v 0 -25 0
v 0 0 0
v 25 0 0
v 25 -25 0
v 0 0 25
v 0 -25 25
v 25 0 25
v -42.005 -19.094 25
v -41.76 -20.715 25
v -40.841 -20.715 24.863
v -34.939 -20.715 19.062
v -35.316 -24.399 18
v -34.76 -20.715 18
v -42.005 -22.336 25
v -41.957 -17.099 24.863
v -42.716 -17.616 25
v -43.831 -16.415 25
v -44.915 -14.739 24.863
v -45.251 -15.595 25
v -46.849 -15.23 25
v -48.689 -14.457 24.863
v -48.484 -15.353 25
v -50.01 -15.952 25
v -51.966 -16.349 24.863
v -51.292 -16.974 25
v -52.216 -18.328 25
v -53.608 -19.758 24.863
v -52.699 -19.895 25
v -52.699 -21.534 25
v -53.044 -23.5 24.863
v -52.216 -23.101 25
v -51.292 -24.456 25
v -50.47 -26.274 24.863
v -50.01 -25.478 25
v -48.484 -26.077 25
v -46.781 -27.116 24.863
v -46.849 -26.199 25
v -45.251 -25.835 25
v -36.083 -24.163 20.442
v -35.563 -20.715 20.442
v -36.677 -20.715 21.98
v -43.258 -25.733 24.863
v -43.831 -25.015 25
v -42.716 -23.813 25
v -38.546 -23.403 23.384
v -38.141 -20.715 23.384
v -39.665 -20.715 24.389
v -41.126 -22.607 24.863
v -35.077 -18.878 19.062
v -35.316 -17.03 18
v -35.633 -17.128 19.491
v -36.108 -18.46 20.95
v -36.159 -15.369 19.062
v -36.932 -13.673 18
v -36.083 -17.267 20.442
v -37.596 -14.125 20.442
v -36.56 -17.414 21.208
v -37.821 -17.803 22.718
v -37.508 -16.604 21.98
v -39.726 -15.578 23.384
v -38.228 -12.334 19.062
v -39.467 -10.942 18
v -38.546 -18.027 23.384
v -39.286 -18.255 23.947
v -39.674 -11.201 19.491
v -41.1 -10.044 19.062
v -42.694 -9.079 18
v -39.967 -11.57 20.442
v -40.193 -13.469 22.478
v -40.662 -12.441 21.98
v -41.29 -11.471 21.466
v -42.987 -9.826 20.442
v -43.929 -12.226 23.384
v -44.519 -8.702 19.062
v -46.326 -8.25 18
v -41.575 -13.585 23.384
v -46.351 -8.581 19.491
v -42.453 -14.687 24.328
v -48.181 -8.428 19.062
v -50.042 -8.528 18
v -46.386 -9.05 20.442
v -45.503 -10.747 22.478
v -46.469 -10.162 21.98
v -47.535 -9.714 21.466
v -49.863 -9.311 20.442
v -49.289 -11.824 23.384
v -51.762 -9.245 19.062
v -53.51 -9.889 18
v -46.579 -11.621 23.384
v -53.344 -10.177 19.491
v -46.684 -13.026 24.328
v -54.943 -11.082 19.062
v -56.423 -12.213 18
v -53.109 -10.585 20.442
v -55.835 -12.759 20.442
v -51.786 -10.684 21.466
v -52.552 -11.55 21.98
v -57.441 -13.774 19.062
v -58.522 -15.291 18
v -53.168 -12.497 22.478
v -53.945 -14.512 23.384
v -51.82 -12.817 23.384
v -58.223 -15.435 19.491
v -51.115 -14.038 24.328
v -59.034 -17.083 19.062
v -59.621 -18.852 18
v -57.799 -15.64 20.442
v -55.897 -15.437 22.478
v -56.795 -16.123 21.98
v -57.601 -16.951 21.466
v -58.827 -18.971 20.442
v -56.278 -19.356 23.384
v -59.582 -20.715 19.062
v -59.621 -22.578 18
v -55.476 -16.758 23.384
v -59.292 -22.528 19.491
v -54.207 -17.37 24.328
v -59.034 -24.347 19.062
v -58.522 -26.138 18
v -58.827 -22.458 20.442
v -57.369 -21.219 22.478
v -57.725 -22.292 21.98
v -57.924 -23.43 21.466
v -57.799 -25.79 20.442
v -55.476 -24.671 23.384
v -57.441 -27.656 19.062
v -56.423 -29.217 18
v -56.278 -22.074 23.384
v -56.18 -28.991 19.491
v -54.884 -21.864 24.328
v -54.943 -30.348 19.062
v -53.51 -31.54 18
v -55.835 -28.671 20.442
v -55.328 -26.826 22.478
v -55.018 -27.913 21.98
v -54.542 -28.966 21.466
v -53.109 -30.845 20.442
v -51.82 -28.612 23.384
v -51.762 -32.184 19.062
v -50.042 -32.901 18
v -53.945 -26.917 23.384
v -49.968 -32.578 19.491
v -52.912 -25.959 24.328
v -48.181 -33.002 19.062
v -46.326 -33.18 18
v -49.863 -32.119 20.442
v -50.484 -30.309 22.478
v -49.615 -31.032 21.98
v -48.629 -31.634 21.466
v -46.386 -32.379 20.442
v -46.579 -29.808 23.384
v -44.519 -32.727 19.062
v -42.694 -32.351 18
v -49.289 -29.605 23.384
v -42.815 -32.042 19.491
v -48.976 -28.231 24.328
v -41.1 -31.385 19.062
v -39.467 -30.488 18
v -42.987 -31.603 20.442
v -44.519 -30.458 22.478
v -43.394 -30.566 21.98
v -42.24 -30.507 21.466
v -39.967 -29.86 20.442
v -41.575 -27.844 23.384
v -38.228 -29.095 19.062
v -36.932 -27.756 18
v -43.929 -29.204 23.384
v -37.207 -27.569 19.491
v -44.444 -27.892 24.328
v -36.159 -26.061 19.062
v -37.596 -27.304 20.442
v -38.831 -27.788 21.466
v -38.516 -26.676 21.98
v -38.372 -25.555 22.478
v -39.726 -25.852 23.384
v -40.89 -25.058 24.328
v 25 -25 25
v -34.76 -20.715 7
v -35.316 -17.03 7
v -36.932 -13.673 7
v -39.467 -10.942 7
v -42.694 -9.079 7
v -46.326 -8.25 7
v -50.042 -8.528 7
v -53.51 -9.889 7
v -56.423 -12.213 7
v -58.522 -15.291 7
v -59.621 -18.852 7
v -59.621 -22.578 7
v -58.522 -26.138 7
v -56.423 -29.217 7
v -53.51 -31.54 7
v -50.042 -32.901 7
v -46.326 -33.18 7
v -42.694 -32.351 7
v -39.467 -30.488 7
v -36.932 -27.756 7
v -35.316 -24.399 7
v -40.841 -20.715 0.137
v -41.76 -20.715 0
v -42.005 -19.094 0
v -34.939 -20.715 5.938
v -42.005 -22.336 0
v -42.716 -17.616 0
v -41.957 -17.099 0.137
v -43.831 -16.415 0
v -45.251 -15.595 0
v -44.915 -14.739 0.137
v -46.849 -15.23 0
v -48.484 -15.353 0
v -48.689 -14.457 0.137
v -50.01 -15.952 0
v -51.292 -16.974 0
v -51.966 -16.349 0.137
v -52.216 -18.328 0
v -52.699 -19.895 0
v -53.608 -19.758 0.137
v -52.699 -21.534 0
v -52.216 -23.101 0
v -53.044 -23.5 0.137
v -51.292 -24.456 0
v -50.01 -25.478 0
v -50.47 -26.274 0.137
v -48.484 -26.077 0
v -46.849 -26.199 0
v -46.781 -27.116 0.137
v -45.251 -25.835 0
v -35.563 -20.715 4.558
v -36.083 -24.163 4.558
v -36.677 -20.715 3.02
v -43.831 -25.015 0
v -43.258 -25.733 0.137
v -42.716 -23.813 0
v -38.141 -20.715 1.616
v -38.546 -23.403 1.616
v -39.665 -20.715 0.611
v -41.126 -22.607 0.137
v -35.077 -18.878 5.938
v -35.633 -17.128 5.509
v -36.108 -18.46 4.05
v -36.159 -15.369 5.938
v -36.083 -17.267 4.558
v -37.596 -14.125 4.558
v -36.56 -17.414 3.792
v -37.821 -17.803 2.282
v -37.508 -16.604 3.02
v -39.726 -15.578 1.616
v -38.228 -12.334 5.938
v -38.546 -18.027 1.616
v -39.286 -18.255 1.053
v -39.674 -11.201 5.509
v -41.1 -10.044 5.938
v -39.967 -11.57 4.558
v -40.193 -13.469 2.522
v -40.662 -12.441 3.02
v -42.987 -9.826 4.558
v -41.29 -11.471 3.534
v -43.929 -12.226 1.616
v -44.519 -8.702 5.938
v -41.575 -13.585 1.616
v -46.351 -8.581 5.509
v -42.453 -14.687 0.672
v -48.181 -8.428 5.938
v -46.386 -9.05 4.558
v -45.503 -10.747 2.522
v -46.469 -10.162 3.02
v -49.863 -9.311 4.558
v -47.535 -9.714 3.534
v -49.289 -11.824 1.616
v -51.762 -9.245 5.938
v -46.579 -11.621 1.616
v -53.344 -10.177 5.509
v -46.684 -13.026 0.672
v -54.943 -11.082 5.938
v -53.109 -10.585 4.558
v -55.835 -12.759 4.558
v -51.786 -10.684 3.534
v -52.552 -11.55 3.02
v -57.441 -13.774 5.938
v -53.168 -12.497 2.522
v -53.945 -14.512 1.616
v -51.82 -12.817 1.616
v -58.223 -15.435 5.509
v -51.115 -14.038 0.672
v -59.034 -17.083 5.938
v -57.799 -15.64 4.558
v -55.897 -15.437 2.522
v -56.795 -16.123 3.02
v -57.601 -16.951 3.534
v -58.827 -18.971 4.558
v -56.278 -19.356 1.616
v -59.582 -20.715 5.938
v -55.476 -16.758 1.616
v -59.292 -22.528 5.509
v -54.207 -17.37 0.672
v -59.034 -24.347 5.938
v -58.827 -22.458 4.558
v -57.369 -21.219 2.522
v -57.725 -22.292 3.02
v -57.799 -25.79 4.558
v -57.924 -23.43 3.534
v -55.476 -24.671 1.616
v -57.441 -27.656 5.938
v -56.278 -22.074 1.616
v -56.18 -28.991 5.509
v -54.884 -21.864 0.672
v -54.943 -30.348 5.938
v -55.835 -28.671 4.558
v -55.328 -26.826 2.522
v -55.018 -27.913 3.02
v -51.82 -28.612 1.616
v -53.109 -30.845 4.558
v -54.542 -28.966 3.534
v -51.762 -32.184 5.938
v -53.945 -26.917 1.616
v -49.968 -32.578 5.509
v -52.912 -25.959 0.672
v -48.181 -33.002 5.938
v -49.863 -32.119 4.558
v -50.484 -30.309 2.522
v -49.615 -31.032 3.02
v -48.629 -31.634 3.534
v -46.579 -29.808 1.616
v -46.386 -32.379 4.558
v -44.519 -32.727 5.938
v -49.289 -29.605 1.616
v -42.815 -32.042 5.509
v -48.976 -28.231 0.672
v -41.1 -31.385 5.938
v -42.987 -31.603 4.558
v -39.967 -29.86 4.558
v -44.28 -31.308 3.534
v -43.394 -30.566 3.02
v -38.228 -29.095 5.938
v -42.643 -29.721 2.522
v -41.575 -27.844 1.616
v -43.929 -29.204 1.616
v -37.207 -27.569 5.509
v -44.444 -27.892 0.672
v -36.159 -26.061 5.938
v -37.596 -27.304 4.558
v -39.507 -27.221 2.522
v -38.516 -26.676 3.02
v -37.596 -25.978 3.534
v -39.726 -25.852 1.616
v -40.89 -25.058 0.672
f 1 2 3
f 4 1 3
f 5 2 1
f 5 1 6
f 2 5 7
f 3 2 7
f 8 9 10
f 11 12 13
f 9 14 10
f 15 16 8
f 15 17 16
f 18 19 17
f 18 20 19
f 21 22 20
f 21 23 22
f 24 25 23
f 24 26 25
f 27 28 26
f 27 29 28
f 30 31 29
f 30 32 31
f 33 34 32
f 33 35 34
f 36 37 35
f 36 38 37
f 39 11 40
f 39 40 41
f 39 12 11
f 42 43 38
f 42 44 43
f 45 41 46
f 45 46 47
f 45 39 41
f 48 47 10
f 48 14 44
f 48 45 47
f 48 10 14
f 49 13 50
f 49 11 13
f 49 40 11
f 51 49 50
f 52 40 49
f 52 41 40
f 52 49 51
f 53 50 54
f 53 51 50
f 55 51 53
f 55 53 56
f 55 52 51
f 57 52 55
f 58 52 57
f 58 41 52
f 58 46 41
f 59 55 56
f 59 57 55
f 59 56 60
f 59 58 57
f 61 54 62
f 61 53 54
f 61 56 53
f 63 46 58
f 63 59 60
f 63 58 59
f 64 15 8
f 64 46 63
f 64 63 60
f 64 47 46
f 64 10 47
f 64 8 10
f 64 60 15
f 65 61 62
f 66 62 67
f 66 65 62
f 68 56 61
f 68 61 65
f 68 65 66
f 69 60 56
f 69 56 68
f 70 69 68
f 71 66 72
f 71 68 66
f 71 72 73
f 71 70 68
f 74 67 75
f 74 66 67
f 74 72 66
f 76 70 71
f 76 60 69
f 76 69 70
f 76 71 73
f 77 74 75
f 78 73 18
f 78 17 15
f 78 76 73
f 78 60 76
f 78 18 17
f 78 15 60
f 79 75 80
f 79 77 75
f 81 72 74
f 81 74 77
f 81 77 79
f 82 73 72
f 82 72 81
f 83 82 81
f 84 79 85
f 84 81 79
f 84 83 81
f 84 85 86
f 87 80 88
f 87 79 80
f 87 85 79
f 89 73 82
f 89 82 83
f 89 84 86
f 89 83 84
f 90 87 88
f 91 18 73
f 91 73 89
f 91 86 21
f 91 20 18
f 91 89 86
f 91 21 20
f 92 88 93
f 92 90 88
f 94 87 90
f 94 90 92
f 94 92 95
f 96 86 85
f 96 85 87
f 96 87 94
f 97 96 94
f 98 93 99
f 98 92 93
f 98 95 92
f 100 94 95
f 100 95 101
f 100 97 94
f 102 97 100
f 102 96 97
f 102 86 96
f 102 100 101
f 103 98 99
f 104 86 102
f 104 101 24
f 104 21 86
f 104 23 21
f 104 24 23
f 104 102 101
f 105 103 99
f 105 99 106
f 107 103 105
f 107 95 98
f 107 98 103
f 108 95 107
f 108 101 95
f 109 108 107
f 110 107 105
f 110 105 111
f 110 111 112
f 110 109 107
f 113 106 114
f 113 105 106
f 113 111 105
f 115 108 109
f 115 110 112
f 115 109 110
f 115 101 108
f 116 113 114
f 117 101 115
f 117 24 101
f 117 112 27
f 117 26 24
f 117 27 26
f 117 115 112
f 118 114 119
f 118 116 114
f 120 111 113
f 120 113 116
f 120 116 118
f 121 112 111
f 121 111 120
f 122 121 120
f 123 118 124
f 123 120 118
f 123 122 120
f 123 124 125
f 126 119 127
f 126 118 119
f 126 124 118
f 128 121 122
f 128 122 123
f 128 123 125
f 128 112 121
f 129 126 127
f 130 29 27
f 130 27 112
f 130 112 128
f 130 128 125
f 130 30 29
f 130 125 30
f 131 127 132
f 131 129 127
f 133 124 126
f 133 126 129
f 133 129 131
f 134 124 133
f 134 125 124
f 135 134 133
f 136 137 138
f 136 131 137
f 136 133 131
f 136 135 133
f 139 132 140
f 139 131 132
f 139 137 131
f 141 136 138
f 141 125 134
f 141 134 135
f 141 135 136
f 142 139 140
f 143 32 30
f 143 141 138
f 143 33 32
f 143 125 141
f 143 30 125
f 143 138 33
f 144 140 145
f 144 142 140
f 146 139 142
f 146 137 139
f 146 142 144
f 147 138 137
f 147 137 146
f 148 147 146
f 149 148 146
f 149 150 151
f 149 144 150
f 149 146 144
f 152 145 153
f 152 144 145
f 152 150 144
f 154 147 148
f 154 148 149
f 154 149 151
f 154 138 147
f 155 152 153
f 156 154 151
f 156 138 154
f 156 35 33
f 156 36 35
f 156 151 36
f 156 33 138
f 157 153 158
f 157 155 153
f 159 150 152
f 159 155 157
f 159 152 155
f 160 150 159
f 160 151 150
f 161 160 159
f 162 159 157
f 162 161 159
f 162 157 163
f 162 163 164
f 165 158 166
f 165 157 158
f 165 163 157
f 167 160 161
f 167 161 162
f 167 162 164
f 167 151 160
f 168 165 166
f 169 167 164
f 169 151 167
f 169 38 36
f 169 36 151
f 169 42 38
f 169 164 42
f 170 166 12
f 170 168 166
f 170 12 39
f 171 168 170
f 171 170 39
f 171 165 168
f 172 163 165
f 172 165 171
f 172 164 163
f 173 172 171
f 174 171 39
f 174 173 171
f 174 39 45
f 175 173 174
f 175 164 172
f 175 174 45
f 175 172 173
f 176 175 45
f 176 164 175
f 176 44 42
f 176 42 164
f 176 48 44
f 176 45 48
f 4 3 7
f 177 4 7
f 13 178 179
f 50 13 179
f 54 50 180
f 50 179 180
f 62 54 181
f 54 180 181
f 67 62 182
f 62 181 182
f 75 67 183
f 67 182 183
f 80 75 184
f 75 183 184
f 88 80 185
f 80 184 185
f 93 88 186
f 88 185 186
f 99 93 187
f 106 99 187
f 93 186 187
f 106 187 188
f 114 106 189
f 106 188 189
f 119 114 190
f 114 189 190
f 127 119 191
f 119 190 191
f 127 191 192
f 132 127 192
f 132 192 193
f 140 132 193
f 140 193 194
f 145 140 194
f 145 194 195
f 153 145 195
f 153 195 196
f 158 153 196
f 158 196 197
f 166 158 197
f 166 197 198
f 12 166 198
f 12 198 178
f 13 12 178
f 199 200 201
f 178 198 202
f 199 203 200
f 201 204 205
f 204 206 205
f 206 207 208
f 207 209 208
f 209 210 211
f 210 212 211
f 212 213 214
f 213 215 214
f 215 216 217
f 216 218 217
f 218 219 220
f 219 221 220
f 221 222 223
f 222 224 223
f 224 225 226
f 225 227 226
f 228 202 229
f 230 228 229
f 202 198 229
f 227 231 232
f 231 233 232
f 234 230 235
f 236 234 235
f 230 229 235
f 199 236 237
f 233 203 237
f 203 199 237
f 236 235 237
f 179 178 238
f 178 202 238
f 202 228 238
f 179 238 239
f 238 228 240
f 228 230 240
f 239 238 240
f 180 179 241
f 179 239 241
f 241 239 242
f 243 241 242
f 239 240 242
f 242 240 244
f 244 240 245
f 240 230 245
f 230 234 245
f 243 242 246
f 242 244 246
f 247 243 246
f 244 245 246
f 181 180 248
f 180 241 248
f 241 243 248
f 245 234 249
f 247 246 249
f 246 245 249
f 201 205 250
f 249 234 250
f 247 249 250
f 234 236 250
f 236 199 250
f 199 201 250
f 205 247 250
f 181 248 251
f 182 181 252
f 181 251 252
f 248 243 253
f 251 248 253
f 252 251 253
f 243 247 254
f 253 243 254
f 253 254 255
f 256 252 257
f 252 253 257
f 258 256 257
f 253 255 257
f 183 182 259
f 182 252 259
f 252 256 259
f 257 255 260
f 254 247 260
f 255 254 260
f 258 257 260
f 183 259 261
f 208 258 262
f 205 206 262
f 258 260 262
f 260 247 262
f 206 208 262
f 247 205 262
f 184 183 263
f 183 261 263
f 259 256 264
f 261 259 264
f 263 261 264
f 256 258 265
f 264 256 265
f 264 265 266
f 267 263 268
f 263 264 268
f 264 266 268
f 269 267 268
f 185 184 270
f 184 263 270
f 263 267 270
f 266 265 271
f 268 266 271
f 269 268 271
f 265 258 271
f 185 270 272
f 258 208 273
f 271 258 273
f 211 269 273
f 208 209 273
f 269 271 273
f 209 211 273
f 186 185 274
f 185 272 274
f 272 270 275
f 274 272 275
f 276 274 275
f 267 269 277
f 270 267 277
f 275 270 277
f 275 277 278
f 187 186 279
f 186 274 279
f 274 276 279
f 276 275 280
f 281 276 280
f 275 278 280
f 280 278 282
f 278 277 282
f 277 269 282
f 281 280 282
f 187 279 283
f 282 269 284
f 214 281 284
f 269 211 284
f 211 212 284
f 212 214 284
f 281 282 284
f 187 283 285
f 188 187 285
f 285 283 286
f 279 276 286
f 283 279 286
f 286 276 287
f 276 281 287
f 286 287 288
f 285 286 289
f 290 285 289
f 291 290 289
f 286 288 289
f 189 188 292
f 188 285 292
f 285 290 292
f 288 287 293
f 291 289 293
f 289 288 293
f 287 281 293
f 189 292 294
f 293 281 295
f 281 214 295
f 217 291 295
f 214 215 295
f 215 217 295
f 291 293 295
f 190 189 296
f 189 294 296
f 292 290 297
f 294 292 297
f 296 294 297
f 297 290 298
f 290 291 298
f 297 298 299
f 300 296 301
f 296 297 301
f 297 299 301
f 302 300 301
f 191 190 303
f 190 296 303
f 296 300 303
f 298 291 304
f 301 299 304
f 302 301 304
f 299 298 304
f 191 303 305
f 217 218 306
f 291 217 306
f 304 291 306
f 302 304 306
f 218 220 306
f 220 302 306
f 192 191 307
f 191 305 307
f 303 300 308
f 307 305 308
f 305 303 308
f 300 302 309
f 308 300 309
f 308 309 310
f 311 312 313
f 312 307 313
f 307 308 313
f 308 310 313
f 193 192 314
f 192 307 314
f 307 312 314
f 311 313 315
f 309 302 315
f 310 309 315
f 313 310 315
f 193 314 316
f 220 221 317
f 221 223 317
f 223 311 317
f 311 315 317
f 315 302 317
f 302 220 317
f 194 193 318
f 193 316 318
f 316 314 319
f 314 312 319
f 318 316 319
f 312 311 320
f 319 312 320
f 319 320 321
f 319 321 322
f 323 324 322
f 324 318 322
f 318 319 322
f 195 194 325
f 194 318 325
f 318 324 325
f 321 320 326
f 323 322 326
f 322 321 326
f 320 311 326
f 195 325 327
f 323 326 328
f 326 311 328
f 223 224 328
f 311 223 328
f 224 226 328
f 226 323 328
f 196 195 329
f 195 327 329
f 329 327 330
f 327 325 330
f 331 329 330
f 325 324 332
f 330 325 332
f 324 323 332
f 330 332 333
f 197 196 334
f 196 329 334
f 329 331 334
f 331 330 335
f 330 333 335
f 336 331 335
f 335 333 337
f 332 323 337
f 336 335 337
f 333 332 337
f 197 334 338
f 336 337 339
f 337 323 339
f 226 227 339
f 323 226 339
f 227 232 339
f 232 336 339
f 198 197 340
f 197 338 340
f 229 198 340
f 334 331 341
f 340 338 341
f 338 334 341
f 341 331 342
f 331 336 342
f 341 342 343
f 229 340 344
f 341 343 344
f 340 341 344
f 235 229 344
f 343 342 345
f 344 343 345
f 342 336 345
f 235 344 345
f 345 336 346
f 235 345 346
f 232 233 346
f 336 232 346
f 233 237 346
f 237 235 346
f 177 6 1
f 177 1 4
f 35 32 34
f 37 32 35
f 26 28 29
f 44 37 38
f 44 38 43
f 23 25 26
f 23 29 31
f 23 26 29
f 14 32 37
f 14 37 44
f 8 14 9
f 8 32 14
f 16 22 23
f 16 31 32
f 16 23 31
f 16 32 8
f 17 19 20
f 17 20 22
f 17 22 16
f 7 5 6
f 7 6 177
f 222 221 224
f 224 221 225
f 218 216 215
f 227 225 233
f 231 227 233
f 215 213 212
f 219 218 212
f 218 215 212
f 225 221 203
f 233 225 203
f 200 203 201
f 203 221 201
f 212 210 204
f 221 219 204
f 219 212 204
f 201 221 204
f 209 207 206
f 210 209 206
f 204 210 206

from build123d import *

# Parameters (mm, degrees)
F0_W     = 25
F0_H     = 25
F1_DEPTH = 25
F2_R     = 12.5
F3_DEPTH = 25


# Not quite as in the source:
# - a fillet or chamfer that OpenCascade refuses, or shapes differently, is made with other operations: its cross-section is extruded or revolved along the edge and cut away or added


with BuildPart() as f1:
    # F0 (on Front) → F1 (new body)
    with BuildSketch(Plane.XZ):
        with Locations((12.5, 12.5)):
            Rectangle(F0_W, F0_H)
    extrude(amount=F1_DEPTH)


with BuildPart() as f3:
    # F2 (on Top) → F3 (new body)
    with BuildSketch(Plane.XY):
        with Locations((-47.2602769732, -20.7147393376)):
            Circle(F2_R)
    extrude(amount=F3_DEPTH)

    # F4: fillet of radius 7 on 2 edges, made by hand

    # F4_s1 → F4_t2 (revolve, cut)
    with BuildSketch(Plane.XZ.offset(20.7147393376)):
        with BuildLine():
            add(Edge.make_bspline(
                [(-34.7602769732, 18), (-34.7602769732, 25), (-41.7602769732, 25)],
                knots=[0, 0, 0, 1, 1, 1], degree=2, weights=[1, 0.4285714286, 1]))
            Line((-41.7602769732, 25), (-34.7602769732, 25))
            Line((-34.7602769732, 25), (-34.7602769732, 18))
        make_face()
    revolve(axis=Axis((-47.2602769732, -20.7147393376, 25), (0, 0, 1)), mode=Mode.SUBTRACT)

    # F4_s3 → F4_t4 (revolve, cut)
    with BuildSketch(Plane.XZ.offset(20.7147393376)):
        with BuildLine():
            add(Edge.make_bspline(
                [(-34.7602769732, 7), (-34.7602769732, 0), (-41.7602769732, 0)],
                knots=[0, 0, 0, 1, 1, 1], degree=2, weights=[1, 0.4285714286, 1]))
            Line((-41.7602769732, 0), (-34.7602769732, 0))
            Line((-34.7602769732, 0), (-34.7602769732, 7))
        make_face()
    revolve(axis=Axis((-47.2602769732, -20.7147393376, 0), (0, 0, 1)), mode=Mode.SUBTRACT)


solid = Compound([f1.part, f3.part])
